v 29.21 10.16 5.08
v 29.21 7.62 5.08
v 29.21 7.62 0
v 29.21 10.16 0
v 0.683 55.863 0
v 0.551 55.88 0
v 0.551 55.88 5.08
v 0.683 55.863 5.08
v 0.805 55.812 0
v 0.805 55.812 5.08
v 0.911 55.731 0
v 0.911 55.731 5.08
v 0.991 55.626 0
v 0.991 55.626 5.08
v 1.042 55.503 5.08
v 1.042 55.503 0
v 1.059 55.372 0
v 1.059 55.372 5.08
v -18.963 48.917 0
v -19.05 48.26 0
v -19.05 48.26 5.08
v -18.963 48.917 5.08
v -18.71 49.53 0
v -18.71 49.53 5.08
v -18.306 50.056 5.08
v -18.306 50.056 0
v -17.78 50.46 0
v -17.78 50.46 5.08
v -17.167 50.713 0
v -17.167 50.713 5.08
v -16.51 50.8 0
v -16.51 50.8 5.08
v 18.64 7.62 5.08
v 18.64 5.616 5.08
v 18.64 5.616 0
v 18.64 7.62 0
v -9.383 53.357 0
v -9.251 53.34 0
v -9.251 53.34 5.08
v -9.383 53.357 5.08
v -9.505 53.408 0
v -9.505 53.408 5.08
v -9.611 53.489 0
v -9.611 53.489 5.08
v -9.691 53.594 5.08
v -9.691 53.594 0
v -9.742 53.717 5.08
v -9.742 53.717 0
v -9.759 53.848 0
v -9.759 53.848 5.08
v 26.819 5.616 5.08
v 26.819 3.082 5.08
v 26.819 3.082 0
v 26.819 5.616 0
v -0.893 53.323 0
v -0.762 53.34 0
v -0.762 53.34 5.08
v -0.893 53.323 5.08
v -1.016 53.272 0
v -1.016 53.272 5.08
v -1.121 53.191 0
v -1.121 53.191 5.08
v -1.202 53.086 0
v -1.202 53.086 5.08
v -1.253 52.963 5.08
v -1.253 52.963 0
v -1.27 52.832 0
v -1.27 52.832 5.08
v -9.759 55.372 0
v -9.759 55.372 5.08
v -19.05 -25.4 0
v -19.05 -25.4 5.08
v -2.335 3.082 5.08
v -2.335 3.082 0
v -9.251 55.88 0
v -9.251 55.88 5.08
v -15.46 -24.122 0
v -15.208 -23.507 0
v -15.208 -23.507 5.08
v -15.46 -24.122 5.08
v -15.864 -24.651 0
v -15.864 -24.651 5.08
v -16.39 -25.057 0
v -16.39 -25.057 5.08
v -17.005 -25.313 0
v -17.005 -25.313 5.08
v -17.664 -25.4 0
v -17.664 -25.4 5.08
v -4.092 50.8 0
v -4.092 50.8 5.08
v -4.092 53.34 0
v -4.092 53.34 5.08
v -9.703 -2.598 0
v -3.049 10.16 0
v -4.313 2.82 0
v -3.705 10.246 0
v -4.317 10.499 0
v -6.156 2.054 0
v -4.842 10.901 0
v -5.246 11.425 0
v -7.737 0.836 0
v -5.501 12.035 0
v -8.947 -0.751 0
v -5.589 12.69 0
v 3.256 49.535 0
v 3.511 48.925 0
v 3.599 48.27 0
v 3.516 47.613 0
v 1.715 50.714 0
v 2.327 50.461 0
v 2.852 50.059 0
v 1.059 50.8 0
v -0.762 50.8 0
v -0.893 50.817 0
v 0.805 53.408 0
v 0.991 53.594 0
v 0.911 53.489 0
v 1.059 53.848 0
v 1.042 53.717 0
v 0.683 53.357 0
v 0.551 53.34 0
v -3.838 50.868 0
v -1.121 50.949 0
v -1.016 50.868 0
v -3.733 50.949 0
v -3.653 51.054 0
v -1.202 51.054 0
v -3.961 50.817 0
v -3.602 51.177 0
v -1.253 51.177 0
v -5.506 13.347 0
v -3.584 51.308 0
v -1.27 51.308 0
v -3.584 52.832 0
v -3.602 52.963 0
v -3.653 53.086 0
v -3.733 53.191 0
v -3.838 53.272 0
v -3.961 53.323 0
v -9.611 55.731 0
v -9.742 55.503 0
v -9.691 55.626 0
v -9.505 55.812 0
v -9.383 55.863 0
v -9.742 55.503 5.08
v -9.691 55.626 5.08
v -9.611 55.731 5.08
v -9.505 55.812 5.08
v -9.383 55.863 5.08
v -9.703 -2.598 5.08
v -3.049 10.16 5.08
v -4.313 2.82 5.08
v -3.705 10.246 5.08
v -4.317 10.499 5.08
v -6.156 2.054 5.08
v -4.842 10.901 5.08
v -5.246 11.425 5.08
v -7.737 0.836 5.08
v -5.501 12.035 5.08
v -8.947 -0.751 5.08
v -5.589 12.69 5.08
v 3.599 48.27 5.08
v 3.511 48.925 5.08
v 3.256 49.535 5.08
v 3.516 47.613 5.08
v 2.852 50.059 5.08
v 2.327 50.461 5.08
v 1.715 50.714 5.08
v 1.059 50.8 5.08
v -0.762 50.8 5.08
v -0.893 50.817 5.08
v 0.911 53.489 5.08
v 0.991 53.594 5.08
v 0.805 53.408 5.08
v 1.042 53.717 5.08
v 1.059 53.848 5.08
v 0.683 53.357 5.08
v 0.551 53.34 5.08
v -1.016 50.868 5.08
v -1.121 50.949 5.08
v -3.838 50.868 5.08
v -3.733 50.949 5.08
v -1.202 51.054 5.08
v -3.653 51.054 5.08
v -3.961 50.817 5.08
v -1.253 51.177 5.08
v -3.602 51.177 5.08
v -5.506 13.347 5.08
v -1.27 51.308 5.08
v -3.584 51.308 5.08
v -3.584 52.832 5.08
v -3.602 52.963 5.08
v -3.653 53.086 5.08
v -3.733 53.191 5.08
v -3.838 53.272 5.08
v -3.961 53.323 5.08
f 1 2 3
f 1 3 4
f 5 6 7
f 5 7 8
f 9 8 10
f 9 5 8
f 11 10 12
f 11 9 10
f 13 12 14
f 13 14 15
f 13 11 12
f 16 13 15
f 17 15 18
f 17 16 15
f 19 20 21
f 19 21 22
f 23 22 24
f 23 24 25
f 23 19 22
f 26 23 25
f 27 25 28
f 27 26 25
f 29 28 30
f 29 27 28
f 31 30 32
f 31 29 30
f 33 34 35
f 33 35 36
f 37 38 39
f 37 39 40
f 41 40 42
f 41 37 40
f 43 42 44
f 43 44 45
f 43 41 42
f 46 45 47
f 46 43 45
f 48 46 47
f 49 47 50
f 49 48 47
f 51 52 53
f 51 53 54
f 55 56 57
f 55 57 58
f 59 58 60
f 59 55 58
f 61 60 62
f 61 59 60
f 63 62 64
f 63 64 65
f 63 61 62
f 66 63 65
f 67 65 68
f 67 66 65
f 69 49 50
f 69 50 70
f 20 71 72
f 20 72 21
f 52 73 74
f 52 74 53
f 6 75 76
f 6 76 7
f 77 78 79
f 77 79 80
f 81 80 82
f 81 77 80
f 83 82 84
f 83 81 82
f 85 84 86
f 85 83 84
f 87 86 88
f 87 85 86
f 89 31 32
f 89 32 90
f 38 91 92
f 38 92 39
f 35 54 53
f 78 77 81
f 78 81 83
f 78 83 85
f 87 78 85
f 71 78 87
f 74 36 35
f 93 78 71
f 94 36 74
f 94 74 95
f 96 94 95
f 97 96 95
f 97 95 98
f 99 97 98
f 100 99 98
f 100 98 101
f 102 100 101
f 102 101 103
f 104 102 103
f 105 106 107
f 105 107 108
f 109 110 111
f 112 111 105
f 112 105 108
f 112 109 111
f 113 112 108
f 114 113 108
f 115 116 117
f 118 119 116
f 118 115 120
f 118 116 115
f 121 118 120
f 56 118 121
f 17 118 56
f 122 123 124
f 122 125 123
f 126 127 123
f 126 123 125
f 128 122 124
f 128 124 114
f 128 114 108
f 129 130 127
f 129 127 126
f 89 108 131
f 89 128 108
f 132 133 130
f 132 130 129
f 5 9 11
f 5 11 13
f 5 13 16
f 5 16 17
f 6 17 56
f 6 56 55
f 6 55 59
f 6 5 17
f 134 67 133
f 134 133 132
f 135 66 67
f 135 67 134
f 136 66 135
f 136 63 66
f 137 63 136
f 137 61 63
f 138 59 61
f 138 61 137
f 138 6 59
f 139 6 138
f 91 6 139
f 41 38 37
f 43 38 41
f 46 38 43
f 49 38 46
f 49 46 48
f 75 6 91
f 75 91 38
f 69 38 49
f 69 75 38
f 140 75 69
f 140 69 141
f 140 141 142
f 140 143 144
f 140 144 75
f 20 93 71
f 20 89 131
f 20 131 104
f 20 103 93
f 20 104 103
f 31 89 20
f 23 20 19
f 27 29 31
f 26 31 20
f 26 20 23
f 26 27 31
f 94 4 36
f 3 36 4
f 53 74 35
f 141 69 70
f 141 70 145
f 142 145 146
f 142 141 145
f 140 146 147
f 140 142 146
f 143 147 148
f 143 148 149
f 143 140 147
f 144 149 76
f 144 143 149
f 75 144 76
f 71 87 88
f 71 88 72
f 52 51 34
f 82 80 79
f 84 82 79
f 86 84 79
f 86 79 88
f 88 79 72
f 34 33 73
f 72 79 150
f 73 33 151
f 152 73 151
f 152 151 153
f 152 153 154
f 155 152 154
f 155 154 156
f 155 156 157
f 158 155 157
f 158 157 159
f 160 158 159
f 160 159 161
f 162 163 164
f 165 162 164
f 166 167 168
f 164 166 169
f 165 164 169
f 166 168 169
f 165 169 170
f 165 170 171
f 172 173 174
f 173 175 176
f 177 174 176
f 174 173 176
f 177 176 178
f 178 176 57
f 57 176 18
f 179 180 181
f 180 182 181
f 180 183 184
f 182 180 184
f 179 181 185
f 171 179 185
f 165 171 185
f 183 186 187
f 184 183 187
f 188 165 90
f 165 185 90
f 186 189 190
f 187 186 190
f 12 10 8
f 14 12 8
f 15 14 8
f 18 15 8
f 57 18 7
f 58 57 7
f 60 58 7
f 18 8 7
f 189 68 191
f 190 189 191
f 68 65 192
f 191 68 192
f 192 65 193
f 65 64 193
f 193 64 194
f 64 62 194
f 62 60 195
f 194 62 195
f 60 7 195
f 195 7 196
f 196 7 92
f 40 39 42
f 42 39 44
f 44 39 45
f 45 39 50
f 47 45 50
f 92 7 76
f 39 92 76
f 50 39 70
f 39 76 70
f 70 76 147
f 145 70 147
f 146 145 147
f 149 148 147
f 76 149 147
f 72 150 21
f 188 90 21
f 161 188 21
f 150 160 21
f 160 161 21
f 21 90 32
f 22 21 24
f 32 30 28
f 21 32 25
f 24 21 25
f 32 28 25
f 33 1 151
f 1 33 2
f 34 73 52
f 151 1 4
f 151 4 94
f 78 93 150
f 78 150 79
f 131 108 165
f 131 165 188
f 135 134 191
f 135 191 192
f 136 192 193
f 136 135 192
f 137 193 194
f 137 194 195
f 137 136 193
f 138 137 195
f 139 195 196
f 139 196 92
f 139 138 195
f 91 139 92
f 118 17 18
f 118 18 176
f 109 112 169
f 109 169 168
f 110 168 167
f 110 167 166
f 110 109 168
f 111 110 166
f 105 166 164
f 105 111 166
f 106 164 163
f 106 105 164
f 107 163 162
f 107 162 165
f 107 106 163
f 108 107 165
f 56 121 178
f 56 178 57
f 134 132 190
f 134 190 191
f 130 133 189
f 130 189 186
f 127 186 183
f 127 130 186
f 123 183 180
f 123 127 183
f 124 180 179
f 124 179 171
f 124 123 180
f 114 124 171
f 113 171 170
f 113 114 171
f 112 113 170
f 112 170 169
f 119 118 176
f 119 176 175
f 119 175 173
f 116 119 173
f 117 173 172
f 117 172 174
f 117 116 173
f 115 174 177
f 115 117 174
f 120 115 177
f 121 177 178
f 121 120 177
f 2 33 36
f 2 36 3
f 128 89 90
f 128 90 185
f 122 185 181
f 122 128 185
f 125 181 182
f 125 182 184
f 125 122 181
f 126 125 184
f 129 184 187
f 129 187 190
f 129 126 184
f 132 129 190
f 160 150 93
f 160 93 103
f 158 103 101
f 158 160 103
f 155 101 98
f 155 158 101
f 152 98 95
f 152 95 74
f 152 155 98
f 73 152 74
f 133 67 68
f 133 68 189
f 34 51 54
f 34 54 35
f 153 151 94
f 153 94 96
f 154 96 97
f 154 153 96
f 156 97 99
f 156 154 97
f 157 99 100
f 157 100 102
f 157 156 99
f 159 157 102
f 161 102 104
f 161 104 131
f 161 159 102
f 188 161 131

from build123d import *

# Parameters (mm, degrees)
BOSS_EXTRUDE1_DEPTH = 5.08
BOSS_EXTRUDE2_DEPTH = 5.08


with BuildPart() as part:
    # Sketch1 → Boss-Extrude1 (new body)
    with BuildSketch(Plane.XY):
        with BuildLine():
            Line((-9.251487929, 55.88), (0.551476187, 55.88))
            ThreePointArc((0.551476187, 55.88), (0.910686432, 55.731210245), (1.059476187, 55.372))
            Line((1.059476187, 55.372), (1.059476187, 53.848))
            ThreePointArc((1.059476187, 53.848), (0.910686432, 53.488789755), (0.551476187, 53.34))
            Line((0.551476187, 53.34), (-0.762, 53.34))
            ThreePointArc((-0.762, 53.34), (-1.121210245, 53.191210245), (-1.27, 52.832))
            Line((-1.27, 52.832), (-1.27, 51.308))
            ThreePointArc((-1.27, 51.308), (-1.121210245, 50.948789755), (-0.762, 50.8))
            Line((-0.762, 50.8), (1.059476187, 50.8))
            ThreePointArc((1.059476187, 50.8), (3.071209903, 49.810653879), (3.515777519, 47.613328704))
            Line((3.515777519, 47.613328704), (-15.208009334, -23.506671296))
            ThreePointArc((-15.208009334, -23.506671296), (-16.113656787, -24.871733717), (-17.664310667, -25.4))
            Line((-17.664310667, -25.4), (-19.05, -25.4))
            Line((-19.05, -25.4), (-19.05, 48.26))
            ThreePointArc((-19.05, 48.26), (-18.306051224, 50.056051224), (-16.51, 50.8))
            Line((-16.51, 50.8), (-4.092493287, 50.8))
            ThreePointArc((-4.092493287, 50.8), (-3.733283042, 50.948789755), (-3.584493287, 51.308))
            Line((-3.584493287, 51.308), (-3.584493287, 52.832))
            ThreePointArc((-3.584493287, 52.832), (-3.733283042, 53.191210245), (-4.092493287, 53.34))
            Line((-4.092493287, 53.34), (-9.251487929, 53.34))
            ThreePointArc((-9.251487929, 53.34), (-9.610698174, 53.488789755), (-9.759487929, 53.848))
            Line((-9.759487929, 53.848), (-9.759487929, 55.372))
            ThreePointArc((-9.759487929, 55.372), (-9.610698174, 55.731210245), (-9.251487929, 55.88))
        make_face()
    extrude(amount=BOSS_EXTRUDE1_DEPTH)

    # Sketch3 → Boss-Extrude2 (add)
    with BuildSketch(Plane.XY.offset(5.08)):
        with BuildLine():
            Line((29.21, 10.16), (0, 10.16))
            Line((0, 10.16), (-3.049315827, 10.16))
            ThreePointArc((-3.049315827, 10.16), (-5.061049543, 11.149346121), (-5.505617159, 13.346671296))
            Line((-5.505617159, 13.346671296), (-9.703476753, -2.598381736))
            ThreePointArc((-9.703476753, -2.598381736), (-6.986534394, 1.496805525), (-2.334572756, 3.081604376))
            Line((-2.334572756, 3.081604376), (26.819356948, 3.081604376))
            Line((26.819356948, 3.081604376), (26.819356948, 5.616399787))
            Line((26.819356948, 5.616399787), (18.639798787, 5.616399787))
            Line((18.639798787, 5.616399787), (18.639798787, 7.62))
            Line((18.639798787, 7.62), (29.21, 7.62))
            Line((29.21, 7.62), (29.21, 10.16))
        make_face()
    extrude(amount=-BOSS_EXTRUDE2_DEPTH)


solid = part.part
